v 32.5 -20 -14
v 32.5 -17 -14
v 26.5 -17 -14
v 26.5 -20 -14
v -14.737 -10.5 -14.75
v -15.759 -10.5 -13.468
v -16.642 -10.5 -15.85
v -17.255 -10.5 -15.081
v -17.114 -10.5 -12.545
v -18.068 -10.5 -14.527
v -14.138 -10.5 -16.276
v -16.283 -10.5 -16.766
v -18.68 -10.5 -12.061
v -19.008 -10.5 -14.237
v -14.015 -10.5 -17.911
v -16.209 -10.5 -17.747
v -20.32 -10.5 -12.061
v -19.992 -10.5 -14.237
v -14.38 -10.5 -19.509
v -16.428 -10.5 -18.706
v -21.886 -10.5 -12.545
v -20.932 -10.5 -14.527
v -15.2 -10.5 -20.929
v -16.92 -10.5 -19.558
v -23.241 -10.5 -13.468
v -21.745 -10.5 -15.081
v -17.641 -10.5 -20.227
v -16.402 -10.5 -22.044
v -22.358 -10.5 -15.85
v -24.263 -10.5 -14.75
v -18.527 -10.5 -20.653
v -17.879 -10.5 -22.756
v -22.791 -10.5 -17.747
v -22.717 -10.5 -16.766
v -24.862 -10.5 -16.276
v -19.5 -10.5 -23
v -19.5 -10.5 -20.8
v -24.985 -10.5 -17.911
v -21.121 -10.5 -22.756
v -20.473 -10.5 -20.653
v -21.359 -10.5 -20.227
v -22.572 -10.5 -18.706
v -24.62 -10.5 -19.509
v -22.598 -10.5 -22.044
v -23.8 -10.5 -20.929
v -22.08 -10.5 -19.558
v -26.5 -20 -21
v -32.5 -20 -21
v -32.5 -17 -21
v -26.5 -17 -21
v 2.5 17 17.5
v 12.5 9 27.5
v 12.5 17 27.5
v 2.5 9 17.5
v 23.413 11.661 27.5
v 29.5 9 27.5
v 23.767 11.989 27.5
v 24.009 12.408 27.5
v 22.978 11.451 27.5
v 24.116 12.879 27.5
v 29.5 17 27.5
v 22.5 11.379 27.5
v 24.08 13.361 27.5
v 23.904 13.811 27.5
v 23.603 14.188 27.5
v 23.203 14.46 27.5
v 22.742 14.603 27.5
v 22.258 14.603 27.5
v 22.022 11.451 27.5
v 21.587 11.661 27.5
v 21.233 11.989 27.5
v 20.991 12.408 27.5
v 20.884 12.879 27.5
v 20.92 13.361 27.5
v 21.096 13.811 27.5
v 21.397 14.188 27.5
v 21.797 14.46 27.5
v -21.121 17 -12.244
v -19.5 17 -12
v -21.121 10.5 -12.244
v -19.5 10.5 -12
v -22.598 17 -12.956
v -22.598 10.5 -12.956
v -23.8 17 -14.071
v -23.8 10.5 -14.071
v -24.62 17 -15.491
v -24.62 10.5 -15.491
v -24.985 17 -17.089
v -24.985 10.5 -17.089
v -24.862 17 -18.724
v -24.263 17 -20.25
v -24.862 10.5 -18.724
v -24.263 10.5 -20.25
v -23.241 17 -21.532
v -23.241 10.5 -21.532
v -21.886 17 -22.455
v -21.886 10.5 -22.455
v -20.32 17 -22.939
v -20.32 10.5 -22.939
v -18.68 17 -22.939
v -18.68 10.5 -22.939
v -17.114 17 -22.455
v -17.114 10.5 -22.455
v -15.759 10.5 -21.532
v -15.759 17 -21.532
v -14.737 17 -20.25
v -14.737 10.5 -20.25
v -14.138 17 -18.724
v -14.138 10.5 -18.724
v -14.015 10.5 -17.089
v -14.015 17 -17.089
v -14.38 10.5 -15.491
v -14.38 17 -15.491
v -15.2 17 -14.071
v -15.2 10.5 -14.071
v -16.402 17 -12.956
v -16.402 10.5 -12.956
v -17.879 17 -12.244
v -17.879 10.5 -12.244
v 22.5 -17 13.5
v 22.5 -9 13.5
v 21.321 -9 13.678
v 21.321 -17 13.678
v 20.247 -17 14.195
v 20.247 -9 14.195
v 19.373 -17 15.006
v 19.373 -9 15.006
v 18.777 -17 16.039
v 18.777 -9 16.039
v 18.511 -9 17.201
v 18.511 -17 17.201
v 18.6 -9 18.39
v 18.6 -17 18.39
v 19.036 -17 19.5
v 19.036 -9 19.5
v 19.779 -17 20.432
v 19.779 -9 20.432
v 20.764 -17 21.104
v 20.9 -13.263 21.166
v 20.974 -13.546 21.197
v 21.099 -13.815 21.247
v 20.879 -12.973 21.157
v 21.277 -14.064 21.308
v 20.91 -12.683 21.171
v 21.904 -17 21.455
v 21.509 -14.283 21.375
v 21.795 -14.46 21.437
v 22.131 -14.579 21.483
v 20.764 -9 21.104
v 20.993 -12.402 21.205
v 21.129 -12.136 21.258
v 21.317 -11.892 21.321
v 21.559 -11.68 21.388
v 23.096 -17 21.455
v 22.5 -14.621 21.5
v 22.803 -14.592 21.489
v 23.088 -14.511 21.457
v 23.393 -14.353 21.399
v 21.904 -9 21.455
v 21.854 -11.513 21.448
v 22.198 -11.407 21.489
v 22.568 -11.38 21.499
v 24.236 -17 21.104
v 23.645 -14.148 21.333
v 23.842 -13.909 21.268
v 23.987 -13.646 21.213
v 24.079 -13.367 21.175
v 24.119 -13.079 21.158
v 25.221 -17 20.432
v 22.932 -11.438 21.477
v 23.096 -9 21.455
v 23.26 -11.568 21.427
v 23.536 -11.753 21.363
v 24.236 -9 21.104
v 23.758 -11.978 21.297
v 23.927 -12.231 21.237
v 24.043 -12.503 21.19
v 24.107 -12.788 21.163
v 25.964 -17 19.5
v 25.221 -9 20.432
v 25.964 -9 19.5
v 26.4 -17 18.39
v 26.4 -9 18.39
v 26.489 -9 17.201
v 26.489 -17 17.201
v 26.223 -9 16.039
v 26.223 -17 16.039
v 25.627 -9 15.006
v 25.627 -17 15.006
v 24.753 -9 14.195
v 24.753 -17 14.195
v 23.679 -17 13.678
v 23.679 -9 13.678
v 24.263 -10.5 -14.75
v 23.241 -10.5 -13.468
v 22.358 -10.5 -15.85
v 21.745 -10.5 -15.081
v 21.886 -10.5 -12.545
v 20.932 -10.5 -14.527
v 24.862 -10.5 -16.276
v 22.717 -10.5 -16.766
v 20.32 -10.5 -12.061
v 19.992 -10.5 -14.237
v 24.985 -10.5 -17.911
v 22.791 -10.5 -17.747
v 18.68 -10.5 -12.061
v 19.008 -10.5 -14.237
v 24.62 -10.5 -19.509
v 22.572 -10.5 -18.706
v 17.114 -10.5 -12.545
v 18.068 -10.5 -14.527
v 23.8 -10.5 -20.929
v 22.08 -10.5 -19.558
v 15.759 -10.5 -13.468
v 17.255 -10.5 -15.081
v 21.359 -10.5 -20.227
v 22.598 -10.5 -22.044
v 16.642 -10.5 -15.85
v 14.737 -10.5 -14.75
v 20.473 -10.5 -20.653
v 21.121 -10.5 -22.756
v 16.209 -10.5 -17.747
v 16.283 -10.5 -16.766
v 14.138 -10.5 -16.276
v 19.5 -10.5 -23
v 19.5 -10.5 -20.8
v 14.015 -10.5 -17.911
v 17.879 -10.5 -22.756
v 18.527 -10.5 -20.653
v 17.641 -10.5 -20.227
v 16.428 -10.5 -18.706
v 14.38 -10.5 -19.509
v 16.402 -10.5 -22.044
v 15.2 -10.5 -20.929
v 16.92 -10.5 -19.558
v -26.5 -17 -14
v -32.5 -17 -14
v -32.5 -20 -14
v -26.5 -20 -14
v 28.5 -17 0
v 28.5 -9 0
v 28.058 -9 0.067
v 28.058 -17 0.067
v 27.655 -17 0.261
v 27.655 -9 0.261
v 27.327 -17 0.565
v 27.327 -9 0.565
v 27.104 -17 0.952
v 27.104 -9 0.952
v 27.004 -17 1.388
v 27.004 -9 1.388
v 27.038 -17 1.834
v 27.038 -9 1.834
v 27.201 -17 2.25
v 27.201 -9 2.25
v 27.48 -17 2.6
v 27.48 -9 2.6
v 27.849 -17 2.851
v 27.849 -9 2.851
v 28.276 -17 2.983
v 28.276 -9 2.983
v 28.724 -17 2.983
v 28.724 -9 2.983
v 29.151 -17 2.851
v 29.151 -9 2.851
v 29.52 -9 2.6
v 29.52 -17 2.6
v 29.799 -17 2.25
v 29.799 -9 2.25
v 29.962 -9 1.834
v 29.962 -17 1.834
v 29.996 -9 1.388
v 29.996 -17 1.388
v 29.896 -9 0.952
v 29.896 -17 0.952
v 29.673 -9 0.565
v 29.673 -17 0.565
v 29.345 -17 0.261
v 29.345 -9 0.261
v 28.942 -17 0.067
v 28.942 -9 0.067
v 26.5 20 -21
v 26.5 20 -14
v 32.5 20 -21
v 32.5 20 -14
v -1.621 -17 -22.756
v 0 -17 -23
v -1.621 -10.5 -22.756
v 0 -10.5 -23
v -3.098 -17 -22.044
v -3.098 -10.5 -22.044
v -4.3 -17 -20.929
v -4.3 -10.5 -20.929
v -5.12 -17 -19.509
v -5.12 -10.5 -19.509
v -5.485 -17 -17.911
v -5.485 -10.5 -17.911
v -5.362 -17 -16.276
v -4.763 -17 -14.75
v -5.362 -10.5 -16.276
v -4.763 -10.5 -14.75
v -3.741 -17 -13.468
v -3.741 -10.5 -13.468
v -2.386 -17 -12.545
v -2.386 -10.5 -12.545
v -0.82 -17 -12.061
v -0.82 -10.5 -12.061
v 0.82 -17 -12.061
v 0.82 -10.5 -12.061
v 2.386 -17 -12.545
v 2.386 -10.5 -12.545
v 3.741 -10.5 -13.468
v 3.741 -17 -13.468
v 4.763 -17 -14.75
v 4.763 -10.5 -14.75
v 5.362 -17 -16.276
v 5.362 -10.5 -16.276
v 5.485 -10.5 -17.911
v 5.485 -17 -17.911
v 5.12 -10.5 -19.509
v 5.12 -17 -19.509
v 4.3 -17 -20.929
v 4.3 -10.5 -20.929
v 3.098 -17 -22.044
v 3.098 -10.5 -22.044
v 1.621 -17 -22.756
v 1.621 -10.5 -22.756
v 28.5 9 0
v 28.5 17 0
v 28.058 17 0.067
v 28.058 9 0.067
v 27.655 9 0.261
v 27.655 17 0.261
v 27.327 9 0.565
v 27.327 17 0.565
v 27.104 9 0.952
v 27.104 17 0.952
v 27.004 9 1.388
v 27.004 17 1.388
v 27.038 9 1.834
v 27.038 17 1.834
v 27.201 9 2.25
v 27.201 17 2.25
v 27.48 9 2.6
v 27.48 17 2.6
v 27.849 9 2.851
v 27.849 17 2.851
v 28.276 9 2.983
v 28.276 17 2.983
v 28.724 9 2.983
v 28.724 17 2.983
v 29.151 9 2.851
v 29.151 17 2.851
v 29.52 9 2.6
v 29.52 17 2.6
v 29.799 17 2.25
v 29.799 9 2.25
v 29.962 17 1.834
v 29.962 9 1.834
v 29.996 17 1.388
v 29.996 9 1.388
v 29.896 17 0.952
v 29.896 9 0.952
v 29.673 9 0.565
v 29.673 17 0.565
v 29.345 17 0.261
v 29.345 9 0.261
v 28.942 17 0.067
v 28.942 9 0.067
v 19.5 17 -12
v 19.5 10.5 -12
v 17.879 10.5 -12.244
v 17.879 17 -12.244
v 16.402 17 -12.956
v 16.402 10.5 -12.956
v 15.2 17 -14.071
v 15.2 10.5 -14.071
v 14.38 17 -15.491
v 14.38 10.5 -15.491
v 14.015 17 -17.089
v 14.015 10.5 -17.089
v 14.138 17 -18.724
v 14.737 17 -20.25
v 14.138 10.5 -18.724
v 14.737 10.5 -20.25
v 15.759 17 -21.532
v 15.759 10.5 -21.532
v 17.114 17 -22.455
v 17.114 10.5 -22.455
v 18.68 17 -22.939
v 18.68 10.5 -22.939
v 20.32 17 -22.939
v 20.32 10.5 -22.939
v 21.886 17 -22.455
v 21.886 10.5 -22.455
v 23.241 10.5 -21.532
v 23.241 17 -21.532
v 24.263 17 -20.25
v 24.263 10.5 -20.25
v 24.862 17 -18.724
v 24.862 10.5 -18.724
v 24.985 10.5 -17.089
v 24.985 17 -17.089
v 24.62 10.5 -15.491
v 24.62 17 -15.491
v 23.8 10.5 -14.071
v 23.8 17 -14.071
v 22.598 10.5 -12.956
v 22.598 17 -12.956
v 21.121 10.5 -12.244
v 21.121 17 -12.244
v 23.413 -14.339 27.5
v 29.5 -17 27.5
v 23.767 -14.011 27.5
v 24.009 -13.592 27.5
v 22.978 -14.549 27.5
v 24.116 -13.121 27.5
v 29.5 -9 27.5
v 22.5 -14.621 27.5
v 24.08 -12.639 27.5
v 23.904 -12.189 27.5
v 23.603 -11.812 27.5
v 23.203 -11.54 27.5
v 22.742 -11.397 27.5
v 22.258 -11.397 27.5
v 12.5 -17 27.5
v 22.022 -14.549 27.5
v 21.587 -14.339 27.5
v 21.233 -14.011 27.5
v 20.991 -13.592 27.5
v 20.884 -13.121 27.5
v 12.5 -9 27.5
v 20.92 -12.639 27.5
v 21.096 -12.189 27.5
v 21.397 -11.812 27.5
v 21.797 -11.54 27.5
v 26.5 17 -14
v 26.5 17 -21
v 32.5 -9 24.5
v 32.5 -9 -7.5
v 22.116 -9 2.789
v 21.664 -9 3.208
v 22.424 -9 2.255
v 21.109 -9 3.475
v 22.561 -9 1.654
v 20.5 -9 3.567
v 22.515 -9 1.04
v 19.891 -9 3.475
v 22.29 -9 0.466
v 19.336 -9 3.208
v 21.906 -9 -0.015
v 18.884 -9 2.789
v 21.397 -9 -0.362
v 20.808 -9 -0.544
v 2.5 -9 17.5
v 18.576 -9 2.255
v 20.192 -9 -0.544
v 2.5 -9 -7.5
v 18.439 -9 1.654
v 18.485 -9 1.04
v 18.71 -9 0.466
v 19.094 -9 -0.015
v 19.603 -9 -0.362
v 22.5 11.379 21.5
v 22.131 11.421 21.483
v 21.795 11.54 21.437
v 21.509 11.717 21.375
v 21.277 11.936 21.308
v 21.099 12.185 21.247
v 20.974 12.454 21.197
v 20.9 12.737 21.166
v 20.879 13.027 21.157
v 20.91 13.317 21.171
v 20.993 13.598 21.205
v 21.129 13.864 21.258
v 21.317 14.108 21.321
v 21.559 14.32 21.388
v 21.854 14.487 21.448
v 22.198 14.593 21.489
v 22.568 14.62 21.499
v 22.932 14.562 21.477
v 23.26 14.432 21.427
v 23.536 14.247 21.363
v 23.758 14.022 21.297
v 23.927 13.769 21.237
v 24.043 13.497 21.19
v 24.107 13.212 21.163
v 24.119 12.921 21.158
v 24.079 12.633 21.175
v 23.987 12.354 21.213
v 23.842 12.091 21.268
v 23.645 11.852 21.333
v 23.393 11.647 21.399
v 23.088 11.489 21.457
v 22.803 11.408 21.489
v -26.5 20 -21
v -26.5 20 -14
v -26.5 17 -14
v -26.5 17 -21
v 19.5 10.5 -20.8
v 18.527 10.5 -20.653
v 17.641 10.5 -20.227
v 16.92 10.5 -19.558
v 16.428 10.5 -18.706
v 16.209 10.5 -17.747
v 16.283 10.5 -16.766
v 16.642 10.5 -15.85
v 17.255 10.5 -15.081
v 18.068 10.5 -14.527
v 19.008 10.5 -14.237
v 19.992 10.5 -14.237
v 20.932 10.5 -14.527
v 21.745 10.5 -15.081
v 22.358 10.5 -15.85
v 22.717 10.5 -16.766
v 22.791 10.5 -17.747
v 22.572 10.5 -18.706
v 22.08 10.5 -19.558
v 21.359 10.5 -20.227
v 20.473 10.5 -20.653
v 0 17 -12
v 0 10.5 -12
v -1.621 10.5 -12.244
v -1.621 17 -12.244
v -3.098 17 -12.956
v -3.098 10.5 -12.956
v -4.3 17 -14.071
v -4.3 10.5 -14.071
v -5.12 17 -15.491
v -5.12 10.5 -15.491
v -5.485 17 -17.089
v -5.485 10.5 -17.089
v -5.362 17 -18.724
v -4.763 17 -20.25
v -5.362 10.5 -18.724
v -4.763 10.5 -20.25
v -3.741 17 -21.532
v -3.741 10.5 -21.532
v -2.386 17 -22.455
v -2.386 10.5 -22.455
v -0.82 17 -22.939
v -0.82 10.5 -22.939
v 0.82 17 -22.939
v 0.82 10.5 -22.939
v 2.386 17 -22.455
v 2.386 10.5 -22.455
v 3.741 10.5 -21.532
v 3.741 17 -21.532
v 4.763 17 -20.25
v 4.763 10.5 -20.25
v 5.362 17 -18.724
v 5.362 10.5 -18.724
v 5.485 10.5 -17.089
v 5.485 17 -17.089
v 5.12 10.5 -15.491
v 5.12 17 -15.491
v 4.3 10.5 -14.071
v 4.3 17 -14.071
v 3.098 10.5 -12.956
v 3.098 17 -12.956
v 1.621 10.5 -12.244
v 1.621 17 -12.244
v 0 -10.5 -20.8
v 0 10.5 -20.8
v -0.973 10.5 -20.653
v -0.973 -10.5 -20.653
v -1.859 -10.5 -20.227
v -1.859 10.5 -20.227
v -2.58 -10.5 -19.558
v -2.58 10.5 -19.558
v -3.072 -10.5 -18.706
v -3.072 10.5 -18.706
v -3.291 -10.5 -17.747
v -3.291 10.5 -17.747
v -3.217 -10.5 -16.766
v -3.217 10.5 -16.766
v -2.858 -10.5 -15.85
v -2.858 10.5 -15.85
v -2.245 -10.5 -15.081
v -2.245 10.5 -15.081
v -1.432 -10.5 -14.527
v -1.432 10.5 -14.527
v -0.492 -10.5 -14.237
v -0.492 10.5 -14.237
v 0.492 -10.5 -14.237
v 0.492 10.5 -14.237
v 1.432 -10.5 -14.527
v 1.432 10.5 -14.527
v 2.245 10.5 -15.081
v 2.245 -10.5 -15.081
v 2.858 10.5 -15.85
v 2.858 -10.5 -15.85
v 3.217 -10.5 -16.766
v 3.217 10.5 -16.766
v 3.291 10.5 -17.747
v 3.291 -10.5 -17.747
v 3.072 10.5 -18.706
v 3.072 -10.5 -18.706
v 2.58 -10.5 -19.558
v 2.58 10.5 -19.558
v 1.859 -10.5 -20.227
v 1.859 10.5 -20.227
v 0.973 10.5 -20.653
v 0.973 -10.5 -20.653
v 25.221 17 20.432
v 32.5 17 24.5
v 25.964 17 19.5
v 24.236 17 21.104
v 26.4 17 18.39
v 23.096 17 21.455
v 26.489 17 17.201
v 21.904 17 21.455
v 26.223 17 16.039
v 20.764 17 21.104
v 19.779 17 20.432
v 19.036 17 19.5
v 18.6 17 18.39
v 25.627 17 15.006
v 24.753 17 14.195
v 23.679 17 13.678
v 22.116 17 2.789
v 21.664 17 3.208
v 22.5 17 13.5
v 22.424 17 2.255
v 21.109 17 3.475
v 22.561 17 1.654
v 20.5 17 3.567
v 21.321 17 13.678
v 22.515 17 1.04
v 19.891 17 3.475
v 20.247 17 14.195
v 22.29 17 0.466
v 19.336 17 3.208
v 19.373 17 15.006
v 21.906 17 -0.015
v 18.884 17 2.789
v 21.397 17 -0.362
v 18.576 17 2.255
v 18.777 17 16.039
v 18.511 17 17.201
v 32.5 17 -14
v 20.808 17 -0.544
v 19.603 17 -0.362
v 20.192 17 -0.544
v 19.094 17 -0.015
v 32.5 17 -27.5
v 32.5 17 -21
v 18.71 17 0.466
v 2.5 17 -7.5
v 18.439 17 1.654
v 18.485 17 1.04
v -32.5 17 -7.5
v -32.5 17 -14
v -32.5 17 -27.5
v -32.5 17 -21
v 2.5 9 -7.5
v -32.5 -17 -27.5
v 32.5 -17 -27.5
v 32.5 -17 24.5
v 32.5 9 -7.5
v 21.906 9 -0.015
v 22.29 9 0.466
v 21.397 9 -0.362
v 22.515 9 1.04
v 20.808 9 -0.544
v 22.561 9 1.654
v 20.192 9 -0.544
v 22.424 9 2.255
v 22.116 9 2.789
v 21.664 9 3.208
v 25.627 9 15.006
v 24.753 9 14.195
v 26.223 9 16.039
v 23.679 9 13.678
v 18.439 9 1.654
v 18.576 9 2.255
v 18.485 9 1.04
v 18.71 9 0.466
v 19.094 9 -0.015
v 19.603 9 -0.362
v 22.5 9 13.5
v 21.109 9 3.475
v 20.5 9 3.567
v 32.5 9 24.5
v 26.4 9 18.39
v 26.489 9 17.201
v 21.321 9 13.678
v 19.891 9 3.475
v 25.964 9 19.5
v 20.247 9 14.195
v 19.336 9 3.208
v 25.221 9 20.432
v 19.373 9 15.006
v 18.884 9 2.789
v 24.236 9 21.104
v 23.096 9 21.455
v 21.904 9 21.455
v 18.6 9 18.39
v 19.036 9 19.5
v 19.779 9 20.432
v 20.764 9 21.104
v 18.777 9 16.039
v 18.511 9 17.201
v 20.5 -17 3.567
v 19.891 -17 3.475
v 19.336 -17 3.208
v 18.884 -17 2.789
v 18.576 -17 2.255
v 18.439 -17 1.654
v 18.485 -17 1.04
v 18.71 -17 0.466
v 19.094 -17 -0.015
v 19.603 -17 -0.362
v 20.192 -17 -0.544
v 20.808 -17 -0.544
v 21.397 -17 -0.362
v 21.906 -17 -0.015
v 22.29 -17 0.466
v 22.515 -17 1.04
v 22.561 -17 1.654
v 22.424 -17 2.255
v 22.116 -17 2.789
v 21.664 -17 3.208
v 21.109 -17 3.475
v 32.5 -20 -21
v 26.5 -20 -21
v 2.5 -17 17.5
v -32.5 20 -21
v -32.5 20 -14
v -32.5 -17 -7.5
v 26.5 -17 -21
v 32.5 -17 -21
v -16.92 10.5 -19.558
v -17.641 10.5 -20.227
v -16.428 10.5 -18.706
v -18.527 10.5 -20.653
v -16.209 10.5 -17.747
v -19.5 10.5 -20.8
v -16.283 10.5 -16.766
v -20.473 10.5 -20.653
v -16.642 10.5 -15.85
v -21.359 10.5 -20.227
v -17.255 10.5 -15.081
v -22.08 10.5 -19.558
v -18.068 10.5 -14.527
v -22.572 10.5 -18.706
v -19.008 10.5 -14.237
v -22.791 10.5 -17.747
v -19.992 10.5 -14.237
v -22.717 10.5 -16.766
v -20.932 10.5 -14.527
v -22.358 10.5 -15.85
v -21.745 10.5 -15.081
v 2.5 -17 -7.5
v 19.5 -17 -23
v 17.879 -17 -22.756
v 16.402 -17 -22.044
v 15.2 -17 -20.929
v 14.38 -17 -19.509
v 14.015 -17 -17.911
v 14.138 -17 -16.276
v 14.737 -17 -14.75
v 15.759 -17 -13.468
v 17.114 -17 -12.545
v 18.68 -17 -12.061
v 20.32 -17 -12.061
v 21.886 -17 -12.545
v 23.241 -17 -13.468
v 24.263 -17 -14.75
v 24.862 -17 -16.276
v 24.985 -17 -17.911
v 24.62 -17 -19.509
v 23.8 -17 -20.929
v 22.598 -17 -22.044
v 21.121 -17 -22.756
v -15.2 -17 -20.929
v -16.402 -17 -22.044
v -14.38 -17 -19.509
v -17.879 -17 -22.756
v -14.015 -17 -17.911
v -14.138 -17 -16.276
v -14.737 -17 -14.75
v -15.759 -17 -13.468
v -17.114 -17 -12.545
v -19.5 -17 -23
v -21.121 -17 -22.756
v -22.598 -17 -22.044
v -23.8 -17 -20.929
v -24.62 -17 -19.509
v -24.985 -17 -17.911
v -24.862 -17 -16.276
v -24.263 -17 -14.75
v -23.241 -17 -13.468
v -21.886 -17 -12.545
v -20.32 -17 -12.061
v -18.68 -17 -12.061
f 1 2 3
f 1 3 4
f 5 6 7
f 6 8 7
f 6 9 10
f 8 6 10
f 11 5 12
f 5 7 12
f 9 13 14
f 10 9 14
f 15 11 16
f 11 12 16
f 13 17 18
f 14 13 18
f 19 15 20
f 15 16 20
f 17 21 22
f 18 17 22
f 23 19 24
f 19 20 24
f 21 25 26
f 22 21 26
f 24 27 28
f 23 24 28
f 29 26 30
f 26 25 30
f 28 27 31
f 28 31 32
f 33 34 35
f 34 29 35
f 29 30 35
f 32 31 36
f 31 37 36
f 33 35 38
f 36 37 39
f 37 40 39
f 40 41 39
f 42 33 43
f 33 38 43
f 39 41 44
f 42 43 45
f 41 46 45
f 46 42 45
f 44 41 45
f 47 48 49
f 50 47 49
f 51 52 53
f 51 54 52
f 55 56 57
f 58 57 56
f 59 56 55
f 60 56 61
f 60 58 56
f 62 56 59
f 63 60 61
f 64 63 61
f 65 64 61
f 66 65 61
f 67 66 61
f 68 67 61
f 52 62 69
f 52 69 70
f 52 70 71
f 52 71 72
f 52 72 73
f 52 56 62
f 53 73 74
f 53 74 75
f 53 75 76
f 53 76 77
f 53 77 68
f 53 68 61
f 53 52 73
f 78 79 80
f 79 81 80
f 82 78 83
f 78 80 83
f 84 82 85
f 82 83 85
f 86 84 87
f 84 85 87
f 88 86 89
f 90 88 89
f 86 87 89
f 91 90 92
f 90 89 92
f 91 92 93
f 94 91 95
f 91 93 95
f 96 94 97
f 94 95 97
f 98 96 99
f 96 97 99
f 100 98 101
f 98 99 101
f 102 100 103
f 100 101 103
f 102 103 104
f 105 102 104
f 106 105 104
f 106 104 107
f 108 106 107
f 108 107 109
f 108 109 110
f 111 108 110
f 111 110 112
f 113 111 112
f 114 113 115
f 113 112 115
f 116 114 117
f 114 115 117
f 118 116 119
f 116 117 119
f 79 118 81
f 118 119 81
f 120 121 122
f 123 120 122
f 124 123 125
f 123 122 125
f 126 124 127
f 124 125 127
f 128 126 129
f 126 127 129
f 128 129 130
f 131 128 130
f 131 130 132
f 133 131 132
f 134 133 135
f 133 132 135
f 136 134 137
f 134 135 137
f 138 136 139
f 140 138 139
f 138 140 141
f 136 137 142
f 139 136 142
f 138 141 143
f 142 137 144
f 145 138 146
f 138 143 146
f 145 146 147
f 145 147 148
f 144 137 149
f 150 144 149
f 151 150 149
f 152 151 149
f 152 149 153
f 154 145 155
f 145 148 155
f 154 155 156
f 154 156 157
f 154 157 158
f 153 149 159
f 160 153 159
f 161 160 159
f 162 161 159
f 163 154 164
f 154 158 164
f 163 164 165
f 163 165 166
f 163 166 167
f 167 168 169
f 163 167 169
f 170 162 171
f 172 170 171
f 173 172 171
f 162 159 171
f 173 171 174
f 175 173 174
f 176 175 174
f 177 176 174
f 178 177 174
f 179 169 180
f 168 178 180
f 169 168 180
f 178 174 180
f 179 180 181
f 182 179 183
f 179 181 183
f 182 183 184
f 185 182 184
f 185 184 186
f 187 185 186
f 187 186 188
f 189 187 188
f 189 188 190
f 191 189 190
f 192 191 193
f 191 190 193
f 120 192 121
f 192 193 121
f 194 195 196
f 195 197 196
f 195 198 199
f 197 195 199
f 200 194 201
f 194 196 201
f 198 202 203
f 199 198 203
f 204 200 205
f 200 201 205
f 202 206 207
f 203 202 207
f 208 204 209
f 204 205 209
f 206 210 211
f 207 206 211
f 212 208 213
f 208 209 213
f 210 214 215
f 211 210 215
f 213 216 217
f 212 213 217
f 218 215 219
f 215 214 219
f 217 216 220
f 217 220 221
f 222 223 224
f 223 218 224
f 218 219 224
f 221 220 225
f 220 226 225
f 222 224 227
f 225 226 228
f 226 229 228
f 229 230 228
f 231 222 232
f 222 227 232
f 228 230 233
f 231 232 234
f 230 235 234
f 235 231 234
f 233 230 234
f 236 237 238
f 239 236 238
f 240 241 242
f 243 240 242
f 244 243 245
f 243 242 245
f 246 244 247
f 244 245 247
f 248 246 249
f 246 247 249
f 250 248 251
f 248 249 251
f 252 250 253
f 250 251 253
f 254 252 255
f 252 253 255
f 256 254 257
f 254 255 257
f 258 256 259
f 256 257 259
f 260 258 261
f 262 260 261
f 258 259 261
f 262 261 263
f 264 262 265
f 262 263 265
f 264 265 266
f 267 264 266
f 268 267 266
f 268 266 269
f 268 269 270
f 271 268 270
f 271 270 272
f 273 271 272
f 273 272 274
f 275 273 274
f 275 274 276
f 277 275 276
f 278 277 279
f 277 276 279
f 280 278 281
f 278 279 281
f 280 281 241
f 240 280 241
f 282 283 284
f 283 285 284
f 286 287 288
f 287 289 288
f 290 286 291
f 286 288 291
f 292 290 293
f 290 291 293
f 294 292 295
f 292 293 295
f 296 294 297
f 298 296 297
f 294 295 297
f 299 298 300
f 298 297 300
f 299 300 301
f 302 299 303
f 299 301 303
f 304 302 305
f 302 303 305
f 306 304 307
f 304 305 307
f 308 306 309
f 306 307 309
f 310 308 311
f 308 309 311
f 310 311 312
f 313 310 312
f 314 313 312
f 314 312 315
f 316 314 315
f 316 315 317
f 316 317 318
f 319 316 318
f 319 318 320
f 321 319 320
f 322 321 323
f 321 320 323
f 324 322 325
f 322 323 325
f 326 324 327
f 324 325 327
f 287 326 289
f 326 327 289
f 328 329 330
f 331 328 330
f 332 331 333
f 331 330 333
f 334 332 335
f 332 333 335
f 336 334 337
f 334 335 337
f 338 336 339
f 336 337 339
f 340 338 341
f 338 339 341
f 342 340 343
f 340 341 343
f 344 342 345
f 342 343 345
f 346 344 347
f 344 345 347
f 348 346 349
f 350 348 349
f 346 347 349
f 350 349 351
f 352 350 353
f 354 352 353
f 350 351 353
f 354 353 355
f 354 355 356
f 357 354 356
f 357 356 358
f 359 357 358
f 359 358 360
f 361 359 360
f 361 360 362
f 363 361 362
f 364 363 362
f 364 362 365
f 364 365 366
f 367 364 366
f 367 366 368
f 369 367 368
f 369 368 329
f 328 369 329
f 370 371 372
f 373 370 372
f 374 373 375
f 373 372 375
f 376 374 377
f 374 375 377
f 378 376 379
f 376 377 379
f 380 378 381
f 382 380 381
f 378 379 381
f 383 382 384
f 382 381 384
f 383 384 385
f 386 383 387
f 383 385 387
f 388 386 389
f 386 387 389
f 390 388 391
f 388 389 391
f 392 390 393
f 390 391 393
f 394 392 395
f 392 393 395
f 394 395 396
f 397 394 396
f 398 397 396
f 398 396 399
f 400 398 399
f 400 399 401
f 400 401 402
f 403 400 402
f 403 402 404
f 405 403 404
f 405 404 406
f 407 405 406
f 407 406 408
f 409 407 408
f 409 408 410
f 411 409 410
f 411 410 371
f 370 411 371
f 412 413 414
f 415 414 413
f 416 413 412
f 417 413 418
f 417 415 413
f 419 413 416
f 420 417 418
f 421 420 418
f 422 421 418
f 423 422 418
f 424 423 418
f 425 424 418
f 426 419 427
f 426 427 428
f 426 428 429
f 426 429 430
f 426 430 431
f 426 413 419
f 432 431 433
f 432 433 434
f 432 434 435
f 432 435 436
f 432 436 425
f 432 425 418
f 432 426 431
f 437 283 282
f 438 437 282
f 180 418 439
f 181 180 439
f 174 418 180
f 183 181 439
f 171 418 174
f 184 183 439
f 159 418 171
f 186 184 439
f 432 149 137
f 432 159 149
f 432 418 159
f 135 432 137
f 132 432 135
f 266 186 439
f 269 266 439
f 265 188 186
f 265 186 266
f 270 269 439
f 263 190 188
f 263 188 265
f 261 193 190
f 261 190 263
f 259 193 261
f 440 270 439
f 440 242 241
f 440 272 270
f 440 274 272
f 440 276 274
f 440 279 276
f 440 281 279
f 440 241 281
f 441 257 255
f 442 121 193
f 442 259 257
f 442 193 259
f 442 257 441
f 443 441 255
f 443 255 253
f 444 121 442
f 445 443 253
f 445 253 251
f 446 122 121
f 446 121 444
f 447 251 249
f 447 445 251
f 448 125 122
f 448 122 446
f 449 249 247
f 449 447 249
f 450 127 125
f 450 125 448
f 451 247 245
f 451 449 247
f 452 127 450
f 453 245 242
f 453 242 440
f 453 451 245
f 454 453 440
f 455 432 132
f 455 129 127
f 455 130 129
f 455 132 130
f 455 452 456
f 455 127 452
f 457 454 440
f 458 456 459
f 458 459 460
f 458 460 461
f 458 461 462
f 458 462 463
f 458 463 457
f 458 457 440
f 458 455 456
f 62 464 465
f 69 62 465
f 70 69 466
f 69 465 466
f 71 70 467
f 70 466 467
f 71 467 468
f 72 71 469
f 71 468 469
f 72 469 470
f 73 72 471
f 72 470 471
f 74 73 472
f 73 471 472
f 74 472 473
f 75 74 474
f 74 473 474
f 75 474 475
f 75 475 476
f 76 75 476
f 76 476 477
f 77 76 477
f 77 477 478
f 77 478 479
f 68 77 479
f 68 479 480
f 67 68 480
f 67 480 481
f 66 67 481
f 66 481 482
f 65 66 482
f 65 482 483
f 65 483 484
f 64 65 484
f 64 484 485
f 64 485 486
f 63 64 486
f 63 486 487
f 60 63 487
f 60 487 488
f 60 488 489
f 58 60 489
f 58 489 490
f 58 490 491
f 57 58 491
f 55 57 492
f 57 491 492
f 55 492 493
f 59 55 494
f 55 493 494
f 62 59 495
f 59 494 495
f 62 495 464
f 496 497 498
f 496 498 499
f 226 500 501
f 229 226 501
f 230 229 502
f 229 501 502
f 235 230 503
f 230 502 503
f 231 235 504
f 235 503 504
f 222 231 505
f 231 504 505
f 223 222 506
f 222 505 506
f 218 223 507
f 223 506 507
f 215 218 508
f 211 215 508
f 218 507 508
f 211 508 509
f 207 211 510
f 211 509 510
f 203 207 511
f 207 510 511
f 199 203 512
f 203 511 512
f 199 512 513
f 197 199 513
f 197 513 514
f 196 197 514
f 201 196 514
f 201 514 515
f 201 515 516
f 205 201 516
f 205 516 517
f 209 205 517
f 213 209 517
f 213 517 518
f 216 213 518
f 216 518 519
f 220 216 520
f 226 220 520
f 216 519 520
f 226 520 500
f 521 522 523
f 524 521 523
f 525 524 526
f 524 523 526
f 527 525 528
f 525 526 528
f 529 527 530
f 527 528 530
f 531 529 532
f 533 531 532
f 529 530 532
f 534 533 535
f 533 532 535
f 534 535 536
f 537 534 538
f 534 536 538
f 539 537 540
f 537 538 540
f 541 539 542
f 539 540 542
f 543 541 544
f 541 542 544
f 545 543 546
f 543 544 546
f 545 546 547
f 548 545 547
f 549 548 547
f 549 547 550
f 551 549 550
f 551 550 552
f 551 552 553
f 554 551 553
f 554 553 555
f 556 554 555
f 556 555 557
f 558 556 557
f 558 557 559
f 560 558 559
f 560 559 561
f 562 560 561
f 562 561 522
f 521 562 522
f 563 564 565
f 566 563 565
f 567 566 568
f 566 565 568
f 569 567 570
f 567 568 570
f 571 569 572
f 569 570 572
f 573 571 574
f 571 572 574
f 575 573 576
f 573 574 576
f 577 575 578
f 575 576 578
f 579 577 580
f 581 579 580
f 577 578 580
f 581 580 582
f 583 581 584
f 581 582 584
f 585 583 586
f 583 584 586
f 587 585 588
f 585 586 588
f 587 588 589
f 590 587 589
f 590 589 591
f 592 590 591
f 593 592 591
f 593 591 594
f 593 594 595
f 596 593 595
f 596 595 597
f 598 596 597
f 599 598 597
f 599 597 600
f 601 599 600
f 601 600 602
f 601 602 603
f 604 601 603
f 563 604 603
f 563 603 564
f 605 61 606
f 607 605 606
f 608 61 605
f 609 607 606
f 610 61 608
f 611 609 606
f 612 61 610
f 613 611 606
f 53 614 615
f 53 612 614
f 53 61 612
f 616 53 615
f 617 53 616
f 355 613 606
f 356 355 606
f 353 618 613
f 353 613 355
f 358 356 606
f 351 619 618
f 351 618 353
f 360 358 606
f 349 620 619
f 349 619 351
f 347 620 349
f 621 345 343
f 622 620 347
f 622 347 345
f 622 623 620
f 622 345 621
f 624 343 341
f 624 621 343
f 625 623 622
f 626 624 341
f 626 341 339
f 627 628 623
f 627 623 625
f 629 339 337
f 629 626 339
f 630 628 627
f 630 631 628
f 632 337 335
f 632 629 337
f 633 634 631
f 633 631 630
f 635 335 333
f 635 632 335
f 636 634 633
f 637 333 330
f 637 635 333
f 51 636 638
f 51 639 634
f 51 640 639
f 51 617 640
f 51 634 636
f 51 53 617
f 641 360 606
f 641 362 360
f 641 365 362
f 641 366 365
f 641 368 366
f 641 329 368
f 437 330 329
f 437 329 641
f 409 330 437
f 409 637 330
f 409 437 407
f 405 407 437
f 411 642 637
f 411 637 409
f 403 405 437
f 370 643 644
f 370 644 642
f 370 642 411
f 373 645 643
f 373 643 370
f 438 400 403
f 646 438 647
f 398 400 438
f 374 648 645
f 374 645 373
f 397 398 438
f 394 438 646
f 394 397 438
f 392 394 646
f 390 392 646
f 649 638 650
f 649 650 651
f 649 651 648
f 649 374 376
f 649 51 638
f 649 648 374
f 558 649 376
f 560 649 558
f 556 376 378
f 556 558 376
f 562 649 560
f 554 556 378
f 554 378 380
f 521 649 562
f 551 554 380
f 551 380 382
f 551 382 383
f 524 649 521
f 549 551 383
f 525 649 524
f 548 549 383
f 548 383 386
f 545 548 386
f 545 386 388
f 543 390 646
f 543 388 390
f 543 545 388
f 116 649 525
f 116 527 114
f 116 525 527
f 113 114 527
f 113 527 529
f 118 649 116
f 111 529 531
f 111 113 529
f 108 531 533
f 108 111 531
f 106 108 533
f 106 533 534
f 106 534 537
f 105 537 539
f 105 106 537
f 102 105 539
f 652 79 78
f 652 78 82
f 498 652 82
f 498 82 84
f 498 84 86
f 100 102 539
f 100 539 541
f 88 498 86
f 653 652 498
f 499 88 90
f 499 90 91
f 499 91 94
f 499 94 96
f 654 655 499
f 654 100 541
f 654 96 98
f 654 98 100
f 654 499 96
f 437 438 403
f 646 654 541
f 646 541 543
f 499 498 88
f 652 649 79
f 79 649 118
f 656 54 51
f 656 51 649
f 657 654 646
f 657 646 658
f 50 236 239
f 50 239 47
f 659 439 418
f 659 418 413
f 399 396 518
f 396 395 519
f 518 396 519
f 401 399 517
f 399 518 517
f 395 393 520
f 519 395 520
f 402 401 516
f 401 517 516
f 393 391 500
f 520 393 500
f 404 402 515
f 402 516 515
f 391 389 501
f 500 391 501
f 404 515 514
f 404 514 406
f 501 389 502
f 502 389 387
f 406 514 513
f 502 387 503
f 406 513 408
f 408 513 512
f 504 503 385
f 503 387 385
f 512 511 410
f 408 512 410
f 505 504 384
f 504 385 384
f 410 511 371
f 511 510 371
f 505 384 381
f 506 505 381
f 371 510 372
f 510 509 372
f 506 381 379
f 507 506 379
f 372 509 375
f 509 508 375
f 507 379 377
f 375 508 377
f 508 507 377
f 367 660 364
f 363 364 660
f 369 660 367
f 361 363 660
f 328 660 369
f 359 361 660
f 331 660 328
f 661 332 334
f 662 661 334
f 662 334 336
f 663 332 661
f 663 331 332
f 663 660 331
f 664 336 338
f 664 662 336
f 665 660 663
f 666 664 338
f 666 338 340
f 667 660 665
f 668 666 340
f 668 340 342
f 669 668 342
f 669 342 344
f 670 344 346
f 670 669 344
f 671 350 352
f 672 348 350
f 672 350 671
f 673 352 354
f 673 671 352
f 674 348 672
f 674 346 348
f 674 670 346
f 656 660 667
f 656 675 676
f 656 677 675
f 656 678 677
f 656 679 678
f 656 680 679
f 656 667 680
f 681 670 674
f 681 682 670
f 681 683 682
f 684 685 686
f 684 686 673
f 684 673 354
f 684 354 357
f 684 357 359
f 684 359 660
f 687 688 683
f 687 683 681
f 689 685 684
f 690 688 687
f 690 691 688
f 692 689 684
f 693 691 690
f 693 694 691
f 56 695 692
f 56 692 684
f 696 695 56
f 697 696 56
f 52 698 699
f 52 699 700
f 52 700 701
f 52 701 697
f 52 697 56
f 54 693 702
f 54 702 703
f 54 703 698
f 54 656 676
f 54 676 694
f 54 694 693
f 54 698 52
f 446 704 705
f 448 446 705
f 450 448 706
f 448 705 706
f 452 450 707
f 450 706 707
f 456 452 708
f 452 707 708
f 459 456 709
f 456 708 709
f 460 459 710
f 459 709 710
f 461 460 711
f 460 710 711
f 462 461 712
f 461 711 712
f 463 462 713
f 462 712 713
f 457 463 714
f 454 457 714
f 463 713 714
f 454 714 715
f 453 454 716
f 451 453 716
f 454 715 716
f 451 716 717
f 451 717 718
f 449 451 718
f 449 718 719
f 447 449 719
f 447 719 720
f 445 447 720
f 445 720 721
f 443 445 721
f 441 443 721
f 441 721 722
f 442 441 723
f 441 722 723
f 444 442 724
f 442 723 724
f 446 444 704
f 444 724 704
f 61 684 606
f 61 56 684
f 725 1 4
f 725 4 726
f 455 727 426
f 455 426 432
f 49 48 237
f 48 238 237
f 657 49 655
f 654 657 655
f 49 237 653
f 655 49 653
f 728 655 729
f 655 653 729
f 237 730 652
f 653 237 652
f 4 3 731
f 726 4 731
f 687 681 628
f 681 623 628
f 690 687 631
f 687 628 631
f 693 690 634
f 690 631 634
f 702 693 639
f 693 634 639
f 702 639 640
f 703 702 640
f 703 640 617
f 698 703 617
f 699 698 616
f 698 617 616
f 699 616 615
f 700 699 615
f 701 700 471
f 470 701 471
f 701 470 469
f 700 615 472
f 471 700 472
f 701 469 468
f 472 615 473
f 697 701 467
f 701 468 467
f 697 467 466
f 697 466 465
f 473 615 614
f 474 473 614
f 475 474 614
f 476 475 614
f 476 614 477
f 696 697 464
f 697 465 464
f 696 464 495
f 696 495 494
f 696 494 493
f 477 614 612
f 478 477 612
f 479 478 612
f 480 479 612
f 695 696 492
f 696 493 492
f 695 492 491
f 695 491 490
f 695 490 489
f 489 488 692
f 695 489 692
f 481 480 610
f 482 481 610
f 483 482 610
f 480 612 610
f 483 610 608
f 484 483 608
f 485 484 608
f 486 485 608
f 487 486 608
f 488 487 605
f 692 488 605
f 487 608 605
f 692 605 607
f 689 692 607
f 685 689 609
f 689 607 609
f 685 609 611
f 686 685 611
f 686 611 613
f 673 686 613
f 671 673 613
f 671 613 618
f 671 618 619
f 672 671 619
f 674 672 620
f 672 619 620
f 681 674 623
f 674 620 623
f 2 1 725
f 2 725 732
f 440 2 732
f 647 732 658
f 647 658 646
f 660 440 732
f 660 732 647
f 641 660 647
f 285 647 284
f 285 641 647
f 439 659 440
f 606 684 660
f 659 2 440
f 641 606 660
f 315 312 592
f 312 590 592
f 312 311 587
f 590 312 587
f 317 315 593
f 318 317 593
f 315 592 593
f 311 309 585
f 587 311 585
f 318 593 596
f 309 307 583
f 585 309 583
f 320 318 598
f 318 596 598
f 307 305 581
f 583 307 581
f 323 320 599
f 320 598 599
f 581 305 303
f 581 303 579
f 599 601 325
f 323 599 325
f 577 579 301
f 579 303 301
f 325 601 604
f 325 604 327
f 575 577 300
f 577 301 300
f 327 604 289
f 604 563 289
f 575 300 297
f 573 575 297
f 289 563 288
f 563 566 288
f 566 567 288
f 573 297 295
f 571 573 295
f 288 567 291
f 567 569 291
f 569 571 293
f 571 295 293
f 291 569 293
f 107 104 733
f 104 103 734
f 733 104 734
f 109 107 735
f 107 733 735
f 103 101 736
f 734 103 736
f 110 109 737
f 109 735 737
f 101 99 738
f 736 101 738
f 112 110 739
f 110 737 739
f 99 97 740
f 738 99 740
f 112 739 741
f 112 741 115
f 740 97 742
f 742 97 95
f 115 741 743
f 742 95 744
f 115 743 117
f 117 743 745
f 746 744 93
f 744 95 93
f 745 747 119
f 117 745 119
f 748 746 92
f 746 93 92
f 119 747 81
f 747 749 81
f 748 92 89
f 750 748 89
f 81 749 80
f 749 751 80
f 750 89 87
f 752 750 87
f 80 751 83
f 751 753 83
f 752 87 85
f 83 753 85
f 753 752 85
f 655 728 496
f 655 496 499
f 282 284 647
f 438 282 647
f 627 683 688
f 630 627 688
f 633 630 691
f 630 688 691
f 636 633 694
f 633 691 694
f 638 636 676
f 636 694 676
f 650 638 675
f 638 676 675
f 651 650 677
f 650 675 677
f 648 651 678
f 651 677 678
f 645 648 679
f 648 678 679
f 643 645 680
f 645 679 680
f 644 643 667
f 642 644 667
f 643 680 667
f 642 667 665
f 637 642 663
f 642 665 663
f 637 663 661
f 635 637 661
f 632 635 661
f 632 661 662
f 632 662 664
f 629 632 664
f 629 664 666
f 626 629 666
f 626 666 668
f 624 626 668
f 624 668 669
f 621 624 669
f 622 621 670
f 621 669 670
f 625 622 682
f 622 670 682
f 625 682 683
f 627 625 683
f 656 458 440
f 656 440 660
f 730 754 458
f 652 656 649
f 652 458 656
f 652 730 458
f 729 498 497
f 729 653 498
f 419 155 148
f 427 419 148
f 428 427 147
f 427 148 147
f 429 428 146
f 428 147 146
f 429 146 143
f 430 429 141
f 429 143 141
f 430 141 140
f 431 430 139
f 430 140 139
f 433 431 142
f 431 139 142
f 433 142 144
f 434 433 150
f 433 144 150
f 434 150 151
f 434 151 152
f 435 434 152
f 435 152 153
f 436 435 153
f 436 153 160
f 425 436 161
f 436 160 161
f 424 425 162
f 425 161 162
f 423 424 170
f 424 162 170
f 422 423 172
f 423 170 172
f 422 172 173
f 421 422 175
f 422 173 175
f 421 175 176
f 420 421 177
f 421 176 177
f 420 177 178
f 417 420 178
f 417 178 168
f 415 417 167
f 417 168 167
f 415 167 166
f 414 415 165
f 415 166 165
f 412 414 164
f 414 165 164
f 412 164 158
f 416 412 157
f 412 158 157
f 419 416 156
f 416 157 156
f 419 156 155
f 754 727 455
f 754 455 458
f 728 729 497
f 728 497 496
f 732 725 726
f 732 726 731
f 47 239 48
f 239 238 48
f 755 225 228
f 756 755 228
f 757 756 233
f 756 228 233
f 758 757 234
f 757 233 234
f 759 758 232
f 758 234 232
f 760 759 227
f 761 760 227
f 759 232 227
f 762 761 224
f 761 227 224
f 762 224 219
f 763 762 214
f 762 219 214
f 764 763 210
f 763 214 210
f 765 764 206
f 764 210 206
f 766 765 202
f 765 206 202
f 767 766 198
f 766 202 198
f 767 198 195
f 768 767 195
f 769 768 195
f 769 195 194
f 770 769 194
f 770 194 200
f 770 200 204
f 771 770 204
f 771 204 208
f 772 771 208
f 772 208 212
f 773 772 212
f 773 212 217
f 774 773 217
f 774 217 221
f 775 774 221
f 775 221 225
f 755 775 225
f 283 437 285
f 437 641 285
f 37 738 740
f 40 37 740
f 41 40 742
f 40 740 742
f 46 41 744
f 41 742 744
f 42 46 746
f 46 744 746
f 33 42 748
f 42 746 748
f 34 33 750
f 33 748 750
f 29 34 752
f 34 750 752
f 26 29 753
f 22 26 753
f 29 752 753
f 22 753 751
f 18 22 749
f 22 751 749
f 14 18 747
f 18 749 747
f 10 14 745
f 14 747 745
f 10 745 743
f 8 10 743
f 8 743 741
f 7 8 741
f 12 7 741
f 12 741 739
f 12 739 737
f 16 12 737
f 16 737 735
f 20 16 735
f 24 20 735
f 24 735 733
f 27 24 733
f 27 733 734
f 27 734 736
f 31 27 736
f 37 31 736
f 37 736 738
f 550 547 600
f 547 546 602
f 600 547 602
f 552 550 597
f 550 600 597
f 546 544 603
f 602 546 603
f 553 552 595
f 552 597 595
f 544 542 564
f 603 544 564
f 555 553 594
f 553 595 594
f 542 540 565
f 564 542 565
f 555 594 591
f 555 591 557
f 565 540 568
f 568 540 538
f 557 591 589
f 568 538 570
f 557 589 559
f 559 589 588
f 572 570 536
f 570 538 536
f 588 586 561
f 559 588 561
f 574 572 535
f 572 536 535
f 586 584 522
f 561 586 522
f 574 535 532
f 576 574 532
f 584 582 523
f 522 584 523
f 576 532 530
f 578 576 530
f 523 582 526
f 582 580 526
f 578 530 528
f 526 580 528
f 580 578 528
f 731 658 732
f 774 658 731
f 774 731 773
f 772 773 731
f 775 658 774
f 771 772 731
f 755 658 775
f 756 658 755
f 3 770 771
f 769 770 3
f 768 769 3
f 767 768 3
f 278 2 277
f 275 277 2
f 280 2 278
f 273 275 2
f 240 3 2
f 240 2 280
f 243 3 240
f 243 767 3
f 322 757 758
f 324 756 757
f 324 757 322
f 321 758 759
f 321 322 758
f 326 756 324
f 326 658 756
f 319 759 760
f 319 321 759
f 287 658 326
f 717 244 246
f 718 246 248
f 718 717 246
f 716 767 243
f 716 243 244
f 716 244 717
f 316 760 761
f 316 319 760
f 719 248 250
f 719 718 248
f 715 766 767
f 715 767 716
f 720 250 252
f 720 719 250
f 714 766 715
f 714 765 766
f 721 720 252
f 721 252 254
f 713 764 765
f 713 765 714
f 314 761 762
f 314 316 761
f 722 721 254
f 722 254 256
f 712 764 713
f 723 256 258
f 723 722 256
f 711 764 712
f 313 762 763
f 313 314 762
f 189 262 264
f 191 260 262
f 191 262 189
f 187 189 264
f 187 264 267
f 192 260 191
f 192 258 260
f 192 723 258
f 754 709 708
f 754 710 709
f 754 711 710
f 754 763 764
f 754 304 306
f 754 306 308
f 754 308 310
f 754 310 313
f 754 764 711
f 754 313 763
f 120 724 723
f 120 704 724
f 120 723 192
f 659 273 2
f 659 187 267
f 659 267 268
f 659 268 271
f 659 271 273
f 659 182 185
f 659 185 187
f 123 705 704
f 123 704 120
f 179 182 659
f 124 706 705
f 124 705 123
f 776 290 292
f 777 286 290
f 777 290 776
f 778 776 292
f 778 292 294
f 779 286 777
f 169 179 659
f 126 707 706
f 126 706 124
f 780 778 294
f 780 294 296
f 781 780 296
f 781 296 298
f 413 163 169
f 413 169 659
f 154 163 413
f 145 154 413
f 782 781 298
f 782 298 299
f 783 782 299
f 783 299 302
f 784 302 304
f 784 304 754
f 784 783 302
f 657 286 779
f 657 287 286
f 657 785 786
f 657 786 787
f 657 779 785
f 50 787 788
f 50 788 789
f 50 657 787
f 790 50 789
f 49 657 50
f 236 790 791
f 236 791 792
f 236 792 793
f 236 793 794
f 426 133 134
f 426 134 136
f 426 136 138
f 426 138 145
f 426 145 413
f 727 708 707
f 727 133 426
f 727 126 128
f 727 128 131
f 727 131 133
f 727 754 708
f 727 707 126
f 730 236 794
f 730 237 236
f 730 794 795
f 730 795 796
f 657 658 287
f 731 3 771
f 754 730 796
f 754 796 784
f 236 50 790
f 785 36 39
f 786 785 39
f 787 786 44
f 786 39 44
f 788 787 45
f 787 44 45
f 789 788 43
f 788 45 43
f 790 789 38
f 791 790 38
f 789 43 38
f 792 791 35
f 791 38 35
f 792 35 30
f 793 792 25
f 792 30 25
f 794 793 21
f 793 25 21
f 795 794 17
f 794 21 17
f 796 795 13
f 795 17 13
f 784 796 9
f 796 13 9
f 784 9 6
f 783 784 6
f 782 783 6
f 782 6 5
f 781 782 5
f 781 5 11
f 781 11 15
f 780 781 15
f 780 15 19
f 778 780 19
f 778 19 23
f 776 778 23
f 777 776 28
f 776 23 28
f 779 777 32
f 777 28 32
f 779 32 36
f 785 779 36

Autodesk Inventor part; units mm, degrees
ref_plane "YZ Plane" through (0, 0, 0) normal (1, 0, 0) x (0, 1, 0)
ref_plane "XZ Plane" through (0, 0, 0) normal (0, 1, 0) x (-1, 0, 0)
ref_plane "XY Plane" through (0, 0, 0) normal (0, 0, 1) x (1, 0, 0)
sketch "Sketch2" plane through (0, 0, 0) normal (1, 0, 0) x (0, 1, 0)
  line L0 (17, -27.5) -> (-17, -27.5)
  line L1 (-17, -27.5) -> (-17, 27.5)
  line L2 (-17, 27.5) -> (17, 27.5)
  line L3 (17, 27.5) -> (17, -27.5)
  line L4 (17, -27.5) -> (-17, 27.5) construction
  line L5 (-17, -27.5) -> (17, 27.5) construction
  line L6 (9, 27.5) -> (-9, 27.5)
  line L7 (-9, 27.5) -> (-9, -7.5)
  line L8 (-9, -7.5) -> (9, -7.5)
  line L9 (9, -7.5) -> (9, 27.5)
  point P0 (0, 0)
  point P1 (-9, 27.5)
  dimension "d1" = 34
  dimension "d2" = 55
  dimension "d3" = 8
  dimension "d4" = 8
  dimension "d5" = 20
extrude "Extrusion1" add sketch "Sketch2" along normal mid plane 65 contours L0 L1 L2 L7 L8 L9 L3
sketch "Sketch3" plane through (0, 0, 0) normal (0, 1, 0) x (-1, 0, 0)
  line L0 (32.5, 27.5) -> (-32.5, 27.5) projected
  line L1 (32.5, 27.5) -> (-2.5, 27.5)
  line L2 (-2.5, 27.5) -> (-2.5, -7.5)
  line L3 (-2.5, -7.5) -> (32.5, -7.5)
  line L4 (32.5, -7.5) -> (32.5, 27.5)
  point P0 (0, 0)
  dimension "d8" = 35
  dimension "d9" = 35
extrude "Extrusion2" cut sketch "Sketch3" along normal through all both and the other way through all
sketch "Sketch4" plane through (32.5, 0, 0) normal (1, 0, 0) x (0, 0, -1)
  line L0 (21, -17) -> (14, -17)
  line L1 (14, -17) -> (14, -20)
  line L2 (14, -20) -> (21, -20)
  line L3 (21, -20) -> (21, -17)
  line L4 (27.5, -17) -> (27.5, 17) projected
  line L5 (-27.5, -17) -> (27.5, -17) projected
  line L6 (27.5, 17) -> (27.5, -17) projected
  line L7 (27.5, 0) -> (7.5, 0) construction
  line L8 (7.5, -17) -> (7.5, 17) projected
  line L9 (21, 17) -> (14, 17)
  line L10 (14, 17) -> (14, 20)
  line L11 (14, 20) -> (21, 20)
  line L12 (21, 20) -> (21, 17)
  point P0 (0, 0)
  dimension "d12" = 7
  dimension "d13" = 3
  dimension "d14" = 6.5
extrude "Extrusion3" add sketch "Sketch4" against normal blind 6
extrude "Extrusion4" add sketch "Sketch4" along normal blind 6 from surface at -65
sketch "Sketch5" plane through (-32.5, -17, -27.5) normal (0, -1, 0) x (1, 0, 0)
  line L0 (65, 0) -> (0, 0) projected
  line L1 (65, 6.5) -> (65, 0) projected
  point P0 (32.5, 27.5)
  point P1 (13, 10)
  point P2 (32.5, 10)
  point P3 (52, 10)
  dimension "d19" = 10
  dimension "d20" = 13
  dimension "d21" = 19.5
  dimension "d22" = 19.5
hole "Hole1" at (-19.5, -17, -17.5) at (0, -17, -17.5) at (19.5, -17, -17.5) direction (0, 1, 0) diameter 6.6 end through all counterbore diameter 11 counterbore depth 6.5 clearance for "Socket Head Cap Screw" size "M6" standard "TS Profile"
sketch "Sketch6" plane through (-32.5, 17, -27.5) normal (0, 1, 0) x (1, 0, 0)
  circle A0 centre (52, -10) radius 3.3 projected
  circle A1 centre (32.5, -10) radius 3.3 projected
  circle A2 centre (13, -10) radius 3.3 projected
  point P0 (32.5, -27.5)
hole "Hole2" at (19.5, 17, -17.5) at (0, 17, -17.5) at (-19.5, 17, -17.5) direction (0, -1, 0) diameter 6.6 end through all counterbore diameter 11 counterbore depth 6.5 clearance for "Socket Head Cap Screw" size "M6" standard "TS Profile"
sketch "Sketch7" plane through (-32.5, -17, -27.5) normal (0, -1, 0) x (1, 0, 0)
  line L0 (65, 0) -> (0, 0) projected
  line L1 (65, 55) -> (65, 13.5) projected
  point P0 (32.5, 27.5)
  point P1 (61, 29)
  dimension "d37" = 29
  dimension "d38" = 4
hole "Hole3" at (28.5, -17, 1.5) direction (0, 1, 0) diameter 3 end through all
sketch "Sketch8" plane through (-32.5, -17, -27.5) normal (0, -1, 0) x (1, 0, 0)
  line L0 (35, 55) -> (65, 55) projected
  line L1 (65, 55) -> (65, 13.5) projected
  point P0 (32.5, 27.5)
  point P1 (55, 45)
  dimension "d46" = 10
  dimension "d47" = 10
hole "Hole4" at (22.5, -17, 17.5) direction (0, 1, 0) diameter 8 end through all
sketch "Sketch9" plane through (32.5, -17, 27.5) normal (0, 0, 1) x (1, 0, 0)
  line L0 (-30, 34) -> (0, 34) projected
  line L1 (-30, 0) -> (0, 0) projected
  line L2 (0, 8) -> (0, 0) projected
  point P0 (-32.5, 17)
  point P1 (-10, 4)
  point P2 (-10, 30)
  dimension "d55" = 4
  dimension "d56" = 4
  dimension "d57" = 10
hole "Hole5" at (22.5, -13, 27.5) at (22.5, 13, 27.5) direction (0, 0, -1) diameter 3.242 depth 10 tip angle 118 thread size "M4x0.7" class "6H" standard "TS profile"
chamfer "Chamfer1" distance 10 angle 45 2 edges at (2.5, -13, 27.5) (2.5, 13, 27.5)
chamfer "Chamfer2" distance 3 angle 45 2 edges at (32.5, -13, 27.5) (32.5, 13, 27.5)
sketch "Sketch10" plane through (-32.5, 17, -27.5) normal (0, 1, 0) x (1, 0, 0)
  circle A0 centre (53, -29) radius 2.5 construction
  line L0 (0, 0) -> (65, 0) projected
  line L1 (65, 0) -> (65, -6.5) projected
  dimension "d71" = 5
  dimension "d72" = 29
  dimension "d74" = 12
hole "Hole6" at (20.5, 17, 1.5) direction (0, -1, 0) diameter 4.134 end through all thread size "M5x0.8" class "6H" standard "TS profile"
equation "\"d56\" = d55"
properties part number "TL20240701-10200AT-001" material "AL6061"
